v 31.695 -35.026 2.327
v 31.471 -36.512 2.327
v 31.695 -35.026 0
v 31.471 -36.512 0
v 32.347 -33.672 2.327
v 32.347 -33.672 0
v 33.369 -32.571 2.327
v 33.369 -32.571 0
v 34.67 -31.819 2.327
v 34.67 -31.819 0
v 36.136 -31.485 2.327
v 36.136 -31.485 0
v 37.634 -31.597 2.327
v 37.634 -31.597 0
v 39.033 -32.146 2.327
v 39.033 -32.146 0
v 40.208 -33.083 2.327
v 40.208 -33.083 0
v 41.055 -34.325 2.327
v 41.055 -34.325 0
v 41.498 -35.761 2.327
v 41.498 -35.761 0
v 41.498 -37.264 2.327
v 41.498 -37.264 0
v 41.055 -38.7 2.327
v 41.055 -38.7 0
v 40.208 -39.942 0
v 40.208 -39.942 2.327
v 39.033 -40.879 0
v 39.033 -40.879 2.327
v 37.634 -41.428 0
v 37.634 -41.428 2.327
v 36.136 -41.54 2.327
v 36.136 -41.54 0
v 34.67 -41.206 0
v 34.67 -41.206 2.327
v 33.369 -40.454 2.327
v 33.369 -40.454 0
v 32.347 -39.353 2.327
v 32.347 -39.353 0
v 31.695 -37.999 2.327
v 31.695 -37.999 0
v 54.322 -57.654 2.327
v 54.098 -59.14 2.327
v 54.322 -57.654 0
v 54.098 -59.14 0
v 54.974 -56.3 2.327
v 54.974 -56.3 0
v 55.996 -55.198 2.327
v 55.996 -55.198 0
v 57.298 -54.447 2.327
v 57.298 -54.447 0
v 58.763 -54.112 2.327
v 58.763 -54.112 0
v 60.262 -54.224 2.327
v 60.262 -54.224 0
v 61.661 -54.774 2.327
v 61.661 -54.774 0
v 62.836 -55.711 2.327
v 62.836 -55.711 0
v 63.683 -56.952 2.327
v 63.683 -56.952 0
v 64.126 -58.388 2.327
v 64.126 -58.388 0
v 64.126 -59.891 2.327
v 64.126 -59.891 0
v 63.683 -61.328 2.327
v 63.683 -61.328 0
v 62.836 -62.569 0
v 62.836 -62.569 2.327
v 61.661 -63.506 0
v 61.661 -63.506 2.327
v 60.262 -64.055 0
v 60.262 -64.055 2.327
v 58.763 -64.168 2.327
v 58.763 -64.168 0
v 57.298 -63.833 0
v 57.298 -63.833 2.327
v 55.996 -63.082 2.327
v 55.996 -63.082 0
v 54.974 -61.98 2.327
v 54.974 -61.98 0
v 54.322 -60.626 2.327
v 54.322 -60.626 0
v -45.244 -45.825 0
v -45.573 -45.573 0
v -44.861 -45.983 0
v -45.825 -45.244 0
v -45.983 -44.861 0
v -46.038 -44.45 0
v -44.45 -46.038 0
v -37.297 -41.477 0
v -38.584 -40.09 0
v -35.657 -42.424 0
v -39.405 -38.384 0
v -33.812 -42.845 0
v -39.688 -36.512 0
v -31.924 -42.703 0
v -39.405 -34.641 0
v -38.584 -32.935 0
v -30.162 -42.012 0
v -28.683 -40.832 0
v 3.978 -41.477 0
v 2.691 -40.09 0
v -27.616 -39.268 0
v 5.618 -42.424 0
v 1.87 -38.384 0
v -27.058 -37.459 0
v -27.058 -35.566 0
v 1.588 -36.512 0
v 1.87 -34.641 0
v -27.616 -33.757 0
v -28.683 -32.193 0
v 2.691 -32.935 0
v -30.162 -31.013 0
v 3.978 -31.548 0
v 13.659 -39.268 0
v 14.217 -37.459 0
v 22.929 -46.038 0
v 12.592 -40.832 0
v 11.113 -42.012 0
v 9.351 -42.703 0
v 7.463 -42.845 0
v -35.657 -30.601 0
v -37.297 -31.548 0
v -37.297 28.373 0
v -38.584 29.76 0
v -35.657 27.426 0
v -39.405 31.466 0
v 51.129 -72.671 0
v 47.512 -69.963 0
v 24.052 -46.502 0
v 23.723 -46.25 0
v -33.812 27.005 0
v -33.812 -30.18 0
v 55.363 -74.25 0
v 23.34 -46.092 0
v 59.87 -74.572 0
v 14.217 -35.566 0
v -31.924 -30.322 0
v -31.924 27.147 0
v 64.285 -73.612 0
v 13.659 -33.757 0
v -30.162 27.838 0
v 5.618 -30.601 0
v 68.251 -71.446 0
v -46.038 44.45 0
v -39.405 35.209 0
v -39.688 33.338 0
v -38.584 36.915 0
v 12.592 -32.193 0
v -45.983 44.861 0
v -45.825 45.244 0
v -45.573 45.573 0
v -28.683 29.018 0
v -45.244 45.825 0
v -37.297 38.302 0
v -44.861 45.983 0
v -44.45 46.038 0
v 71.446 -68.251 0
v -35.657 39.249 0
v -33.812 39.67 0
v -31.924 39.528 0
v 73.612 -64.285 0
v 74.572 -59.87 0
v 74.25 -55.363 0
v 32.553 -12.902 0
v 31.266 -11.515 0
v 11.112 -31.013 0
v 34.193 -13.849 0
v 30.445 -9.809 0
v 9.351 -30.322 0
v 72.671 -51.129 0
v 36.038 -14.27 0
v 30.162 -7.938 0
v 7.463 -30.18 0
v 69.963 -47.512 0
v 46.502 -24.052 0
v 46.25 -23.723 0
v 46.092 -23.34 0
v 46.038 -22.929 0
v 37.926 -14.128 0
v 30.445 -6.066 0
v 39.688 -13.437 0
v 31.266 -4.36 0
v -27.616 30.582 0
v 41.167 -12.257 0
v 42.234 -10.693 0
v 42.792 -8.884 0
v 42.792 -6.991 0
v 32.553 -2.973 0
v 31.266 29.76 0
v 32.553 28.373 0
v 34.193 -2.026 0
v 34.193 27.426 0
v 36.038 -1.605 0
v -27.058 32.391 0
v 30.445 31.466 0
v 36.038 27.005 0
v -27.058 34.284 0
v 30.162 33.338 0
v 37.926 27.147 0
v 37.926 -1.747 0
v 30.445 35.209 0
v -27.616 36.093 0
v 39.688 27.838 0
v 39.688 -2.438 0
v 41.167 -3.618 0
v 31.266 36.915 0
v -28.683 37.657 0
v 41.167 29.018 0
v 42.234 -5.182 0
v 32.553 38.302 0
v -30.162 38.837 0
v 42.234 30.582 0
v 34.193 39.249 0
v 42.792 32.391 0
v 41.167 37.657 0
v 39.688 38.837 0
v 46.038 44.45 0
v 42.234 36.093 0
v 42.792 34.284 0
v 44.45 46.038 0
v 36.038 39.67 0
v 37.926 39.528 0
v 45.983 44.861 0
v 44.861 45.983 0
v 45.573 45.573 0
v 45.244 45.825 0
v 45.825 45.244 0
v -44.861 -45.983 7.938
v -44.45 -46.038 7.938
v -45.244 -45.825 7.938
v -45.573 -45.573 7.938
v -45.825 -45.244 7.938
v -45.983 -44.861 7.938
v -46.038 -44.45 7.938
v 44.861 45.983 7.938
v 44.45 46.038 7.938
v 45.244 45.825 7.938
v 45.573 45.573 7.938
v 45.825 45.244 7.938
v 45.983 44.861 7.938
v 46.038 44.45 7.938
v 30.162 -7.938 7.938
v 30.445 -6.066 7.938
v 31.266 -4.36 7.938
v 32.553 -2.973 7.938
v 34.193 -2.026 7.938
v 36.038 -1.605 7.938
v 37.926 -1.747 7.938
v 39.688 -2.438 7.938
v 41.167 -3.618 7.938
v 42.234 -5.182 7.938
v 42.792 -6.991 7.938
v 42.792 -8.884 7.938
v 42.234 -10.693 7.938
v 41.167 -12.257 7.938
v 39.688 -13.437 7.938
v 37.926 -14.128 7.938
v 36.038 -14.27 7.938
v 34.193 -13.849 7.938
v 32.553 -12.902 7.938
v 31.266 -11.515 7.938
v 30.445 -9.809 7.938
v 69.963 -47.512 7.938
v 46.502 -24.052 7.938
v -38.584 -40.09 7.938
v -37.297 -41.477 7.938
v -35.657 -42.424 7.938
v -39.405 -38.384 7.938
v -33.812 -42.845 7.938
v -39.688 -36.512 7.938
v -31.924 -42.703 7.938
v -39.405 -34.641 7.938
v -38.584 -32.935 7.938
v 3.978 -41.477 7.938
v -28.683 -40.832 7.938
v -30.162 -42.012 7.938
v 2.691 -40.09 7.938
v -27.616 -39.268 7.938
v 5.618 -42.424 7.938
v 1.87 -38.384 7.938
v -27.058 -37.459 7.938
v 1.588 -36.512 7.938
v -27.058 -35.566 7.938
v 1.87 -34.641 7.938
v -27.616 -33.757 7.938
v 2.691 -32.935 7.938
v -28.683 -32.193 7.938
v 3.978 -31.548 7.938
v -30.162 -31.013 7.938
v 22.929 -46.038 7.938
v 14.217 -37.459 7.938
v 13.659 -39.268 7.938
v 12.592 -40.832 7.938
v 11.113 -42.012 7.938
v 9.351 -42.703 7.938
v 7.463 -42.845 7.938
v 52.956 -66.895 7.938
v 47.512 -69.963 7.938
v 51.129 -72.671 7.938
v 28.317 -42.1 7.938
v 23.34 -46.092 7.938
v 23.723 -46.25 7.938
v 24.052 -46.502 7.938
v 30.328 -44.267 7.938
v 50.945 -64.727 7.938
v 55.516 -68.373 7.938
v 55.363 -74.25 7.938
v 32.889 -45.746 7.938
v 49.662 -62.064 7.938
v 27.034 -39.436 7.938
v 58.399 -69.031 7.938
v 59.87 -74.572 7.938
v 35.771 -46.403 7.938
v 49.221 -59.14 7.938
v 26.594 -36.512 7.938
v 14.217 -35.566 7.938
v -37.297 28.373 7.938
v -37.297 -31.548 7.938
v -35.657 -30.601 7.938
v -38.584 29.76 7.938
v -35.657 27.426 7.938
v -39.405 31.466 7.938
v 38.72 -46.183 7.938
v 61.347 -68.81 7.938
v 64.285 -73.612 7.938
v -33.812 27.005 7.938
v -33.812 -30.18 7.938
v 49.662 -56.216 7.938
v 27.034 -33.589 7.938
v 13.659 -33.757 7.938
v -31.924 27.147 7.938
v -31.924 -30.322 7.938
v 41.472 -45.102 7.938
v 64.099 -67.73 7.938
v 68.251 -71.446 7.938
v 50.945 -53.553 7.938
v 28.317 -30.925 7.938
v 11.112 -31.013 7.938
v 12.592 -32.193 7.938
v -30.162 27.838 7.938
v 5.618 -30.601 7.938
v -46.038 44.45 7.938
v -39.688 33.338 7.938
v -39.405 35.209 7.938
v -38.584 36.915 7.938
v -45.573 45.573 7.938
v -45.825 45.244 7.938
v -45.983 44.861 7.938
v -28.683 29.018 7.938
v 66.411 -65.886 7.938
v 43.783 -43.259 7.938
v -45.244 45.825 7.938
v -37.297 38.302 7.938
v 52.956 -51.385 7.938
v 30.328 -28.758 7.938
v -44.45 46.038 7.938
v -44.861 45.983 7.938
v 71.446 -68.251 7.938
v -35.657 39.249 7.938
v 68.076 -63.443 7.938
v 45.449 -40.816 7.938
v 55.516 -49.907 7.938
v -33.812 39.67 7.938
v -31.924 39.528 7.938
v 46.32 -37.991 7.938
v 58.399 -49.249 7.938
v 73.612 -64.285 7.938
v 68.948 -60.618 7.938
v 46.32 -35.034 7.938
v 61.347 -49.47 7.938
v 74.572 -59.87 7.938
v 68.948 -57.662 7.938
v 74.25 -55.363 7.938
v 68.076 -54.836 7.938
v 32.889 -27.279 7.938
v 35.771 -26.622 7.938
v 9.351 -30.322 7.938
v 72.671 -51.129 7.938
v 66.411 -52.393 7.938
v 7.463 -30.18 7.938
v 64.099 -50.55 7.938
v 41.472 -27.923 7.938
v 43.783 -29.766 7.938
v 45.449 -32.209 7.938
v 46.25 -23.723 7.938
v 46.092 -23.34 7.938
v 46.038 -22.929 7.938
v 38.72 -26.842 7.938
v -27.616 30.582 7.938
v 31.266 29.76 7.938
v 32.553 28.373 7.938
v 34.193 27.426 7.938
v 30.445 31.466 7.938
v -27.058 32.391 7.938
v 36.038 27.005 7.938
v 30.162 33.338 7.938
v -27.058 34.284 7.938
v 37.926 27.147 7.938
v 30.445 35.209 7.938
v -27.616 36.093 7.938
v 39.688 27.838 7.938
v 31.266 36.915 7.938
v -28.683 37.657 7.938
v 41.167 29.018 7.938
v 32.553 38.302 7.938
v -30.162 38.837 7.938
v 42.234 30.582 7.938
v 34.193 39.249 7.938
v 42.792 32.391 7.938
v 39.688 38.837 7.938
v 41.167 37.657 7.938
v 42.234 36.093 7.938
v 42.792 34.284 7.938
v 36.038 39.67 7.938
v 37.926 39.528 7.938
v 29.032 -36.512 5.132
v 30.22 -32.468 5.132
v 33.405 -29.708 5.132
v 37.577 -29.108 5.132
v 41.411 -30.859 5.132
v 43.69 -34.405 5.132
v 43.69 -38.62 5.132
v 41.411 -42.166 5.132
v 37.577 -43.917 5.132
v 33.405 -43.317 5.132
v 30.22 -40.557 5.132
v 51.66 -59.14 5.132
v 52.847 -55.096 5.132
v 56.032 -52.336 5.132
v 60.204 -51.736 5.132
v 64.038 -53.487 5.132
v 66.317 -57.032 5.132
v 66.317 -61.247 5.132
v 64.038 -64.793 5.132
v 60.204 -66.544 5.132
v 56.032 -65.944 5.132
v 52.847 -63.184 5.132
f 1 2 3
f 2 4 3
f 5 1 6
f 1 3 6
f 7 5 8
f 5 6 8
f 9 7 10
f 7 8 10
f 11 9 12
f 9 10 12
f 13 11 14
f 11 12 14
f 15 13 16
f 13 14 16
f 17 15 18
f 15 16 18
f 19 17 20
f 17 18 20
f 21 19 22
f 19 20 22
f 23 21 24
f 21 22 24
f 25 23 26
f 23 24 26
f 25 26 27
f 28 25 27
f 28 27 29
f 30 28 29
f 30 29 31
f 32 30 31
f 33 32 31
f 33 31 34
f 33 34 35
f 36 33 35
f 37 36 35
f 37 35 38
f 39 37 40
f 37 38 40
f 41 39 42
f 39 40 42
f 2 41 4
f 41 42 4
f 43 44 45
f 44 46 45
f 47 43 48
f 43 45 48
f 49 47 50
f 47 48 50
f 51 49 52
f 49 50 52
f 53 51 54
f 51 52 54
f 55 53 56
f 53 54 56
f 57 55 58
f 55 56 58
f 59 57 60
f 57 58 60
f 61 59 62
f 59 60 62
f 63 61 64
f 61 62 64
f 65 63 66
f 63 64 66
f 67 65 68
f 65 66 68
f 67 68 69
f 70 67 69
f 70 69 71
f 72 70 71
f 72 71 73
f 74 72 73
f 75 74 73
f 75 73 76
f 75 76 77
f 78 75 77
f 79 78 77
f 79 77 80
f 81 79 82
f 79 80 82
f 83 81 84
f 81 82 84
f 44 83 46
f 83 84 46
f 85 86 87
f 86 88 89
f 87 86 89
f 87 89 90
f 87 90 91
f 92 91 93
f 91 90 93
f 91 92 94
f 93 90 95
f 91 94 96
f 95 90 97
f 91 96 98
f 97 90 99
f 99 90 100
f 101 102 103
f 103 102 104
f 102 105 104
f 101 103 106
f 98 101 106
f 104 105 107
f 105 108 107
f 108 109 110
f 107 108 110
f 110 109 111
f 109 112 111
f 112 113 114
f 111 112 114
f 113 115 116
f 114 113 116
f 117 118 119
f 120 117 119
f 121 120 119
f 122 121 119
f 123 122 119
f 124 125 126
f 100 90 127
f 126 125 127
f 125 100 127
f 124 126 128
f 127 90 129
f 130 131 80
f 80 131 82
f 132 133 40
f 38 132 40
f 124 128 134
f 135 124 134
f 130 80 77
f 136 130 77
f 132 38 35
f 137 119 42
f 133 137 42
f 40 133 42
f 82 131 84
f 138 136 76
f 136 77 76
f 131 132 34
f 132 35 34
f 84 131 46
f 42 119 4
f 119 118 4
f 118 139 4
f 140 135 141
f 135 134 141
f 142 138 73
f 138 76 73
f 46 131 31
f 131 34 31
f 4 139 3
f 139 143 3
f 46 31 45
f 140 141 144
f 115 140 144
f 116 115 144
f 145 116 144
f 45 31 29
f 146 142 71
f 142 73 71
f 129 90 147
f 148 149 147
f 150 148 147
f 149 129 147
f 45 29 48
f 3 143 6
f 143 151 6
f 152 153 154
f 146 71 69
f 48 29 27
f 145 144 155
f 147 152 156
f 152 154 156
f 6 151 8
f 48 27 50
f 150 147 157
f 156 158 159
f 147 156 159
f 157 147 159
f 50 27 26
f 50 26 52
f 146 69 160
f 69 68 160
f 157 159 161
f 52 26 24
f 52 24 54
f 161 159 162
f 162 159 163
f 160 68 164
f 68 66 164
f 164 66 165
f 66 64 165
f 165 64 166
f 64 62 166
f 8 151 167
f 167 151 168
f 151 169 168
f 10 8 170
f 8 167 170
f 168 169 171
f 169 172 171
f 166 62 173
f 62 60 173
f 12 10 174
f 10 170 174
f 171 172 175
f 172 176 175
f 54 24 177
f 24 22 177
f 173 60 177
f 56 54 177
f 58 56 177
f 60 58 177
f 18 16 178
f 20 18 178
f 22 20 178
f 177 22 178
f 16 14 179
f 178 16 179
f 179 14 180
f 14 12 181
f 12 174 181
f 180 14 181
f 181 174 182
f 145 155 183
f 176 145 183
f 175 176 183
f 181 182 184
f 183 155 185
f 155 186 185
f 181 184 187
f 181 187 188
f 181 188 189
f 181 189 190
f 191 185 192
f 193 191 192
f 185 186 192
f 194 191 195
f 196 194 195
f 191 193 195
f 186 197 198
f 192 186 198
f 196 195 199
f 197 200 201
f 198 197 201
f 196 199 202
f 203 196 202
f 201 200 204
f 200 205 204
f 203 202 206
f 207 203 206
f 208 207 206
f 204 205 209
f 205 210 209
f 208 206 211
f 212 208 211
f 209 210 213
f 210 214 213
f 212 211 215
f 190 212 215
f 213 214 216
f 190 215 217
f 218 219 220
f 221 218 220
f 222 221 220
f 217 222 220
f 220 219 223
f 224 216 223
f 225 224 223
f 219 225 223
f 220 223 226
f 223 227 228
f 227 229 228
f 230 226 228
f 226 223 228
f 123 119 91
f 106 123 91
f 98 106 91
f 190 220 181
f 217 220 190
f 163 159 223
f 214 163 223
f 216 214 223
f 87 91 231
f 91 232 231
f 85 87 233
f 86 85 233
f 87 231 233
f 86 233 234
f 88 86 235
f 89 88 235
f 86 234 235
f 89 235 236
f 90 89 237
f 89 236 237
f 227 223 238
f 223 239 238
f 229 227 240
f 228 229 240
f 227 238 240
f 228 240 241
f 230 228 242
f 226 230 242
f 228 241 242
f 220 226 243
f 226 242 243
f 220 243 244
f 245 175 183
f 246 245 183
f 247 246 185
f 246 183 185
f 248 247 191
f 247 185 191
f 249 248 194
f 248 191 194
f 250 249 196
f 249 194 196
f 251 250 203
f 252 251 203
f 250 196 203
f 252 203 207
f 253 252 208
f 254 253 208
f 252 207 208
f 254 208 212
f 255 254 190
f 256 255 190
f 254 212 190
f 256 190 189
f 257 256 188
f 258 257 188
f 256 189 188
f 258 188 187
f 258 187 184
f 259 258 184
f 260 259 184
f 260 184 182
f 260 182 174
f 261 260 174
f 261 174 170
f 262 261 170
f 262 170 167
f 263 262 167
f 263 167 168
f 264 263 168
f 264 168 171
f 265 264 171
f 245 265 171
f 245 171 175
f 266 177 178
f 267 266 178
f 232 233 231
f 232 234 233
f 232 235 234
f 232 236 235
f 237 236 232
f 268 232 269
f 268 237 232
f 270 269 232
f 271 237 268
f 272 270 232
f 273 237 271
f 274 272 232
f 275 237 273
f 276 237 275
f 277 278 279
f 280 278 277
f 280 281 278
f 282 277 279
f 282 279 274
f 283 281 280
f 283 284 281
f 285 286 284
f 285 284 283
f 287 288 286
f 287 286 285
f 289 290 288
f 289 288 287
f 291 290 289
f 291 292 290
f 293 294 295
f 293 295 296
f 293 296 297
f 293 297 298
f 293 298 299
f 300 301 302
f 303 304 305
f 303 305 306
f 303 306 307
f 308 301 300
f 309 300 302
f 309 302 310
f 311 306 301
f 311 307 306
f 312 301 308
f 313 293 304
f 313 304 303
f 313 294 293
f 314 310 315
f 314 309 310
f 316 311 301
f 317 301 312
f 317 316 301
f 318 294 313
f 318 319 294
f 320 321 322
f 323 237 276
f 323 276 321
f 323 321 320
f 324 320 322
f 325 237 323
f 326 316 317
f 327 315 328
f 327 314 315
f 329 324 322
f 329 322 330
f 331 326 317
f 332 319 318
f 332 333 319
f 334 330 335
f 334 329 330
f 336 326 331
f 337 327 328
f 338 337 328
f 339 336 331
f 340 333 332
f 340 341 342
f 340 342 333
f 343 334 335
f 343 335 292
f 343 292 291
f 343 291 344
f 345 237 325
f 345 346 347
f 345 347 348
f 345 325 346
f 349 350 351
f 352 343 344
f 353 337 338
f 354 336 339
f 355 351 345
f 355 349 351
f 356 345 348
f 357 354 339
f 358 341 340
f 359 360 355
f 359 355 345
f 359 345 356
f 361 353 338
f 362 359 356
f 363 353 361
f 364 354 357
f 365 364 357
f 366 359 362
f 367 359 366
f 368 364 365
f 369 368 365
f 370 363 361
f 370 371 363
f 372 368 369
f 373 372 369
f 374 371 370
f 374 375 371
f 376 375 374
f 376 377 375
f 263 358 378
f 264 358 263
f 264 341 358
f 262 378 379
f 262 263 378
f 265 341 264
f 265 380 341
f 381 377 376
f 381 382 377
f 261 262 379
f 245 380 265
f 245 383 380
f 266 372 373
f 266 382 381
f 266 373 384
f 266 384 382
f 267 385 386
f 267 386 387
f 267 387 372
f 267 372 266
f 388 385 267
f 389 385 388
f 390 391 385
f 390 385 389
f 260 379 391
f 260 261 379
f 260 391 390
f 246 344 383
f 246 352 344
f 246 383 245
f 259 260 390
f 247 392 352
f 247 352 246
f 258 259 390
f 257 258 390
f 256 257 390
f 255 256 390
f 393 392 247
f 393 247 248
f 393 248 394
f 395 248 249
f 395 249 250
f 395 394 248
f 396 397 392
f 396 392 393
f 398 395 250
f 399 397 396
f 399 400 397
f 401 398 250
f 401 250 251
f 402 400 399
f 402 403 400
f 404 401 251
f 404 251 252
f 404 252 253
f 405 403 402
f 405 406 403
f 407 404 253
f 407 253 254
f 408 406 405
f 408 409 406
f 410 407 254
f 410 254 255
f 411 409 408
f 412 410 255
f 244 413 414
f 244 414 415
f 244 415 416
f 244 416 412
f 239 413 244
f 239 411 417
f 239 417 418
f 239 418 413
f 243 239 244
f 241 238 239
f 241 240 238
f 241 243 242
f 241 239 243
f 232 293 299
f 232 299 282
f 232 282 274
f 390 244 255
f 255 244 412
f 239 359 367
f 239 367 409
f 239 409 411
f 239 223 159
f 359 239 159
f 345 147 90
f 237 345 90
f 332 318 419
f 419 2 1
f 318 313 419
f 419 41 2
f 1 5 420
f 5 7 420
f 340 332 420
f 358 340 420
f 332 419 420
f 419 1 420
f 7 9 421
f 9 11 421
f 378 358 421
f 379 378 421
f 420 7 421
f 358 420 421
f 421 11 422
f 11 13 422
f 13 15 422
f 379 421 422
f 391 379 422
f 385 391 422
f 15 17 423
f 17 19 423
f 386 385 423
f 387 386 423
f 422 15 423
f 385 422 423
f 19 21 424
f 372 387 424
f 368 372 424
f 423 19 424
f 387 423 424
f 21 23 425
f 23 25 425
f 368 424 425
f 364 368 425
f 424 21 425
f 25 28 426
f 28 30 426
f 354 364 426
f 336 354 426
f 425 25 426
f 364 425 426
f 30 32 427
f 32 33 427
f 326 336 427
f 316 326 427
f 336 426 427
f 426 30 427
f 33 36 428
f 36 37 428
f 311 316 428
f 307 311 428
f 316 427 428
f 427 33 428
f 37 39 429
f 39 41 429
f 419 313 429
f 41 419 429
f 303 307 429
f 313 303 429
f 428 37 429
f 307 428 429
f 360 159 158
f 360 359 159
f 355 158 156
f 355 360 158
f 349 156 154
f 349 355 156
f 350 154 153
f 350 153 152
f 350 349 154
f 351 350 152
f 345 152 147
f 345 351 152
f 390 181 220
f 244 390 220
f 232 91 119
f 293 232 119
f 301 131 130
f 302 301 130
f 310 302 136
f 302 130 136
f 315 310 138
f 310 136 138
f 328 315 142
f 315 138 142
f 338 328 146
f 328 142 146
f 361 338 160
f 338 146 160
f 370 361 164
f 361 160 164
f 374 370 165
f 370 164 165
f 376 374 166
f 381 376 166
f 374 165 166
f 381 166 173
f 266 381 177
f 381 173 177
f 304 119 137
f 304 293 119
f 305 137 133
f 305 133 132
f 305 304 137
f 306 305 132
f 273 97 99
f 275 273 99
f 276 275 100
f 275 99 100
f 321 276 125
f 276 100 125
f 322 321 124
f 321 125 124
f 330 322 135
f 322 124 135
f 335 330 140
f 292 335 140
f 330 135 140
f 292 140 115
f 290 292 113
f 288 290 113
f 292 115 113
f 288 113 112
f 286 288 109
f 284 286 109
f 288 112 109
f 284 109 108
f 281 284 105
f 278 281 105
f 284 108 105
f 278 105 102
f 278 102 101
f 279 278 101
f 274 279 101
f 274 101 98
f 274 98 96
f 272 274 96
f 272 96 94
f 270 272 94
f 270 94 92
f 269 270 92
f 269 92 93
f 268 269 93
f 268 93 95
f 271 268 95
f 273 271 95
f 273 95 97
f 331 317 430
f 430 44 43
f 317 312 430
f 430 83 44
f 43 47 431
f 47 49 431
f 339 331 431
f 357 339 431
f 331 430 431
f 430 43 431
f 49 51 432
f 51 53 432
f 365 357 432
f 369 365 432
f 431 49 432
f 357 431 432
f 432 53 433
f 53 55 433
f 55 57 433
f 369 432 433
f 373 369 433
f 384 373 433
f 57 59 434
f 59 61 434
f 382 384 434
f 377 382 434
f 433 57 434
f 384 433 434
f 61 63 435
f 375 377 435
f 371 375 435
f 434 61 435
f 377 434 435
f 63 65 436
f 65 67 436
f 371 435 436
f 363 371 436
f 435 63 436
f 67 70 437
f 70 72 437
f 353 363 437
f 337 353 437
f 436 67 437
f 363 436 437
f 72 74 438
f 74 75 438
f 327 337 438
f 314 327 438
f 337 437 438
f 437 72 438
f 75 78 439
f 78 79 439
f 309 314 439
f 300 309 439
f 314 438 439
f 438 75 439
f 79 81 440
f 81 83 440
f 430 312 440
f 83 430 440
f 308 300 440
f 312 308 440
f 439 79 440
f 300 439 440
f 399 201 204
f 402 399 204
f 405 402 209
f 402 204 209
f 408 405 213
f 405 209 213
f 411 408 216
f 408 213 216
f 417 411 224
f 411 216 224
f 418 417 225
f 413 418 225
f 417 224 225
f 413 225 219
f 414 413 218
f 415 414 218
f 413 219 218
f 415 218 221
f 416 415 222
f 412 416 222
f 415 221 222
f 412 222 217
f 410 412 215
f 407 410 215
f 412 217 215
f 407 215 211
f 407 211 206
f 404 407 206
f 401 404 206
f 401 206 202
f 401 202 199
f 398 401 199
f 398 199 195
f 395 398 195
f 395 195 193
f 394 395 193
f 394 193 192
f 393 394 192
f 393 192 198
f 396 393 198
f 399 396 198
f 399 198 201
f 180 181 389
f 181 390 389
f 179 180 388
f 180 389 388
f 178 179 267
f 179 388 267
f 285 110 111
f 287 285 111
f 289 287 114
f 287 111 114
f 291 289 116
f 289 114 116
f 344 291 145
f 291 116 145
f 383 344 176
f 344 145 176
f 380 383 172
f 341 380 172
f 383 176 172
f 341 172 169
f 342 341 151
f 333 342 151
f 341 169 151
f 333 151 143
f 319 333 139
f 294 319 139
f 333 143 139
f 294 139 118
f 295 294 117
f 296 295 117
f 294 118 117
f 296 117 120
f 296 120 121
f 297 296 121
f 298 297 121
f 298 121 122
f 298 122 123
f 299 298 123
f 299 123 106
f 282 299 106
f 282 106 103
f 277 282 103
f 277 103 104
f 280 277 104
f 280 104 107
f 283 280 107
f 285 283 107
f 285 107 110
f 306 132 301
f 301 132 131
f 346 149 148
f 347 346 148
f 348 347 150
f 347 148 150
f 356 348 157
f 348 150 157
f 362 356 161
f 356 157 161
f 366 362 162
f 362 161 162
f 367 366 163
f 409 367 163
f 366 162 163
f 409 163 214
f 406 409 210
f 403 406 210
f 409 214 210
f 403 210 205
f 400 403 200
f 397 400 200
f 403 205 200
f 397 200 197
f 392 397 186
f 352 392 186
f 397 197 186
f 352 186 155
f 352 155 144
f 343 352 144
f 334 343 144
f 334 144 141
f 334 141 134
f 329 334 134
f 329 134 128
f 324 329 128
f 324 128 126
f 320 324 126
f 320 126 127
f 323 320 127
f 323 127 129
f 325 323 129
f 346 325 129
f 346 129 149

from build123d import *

# Parameters (mm, degrees)
F1_DEPTH       = 7.9375
F3_D           = 12.7
F5_D           = 10.0838
F5_CSINK_D     = 19.8374
F5_CSINK_ANGLE = 82
F6_R           = 1.5875


with BuildPart() as f1:
    # F0 (on Top) → F1 (new body)
    with BuildSketch(Plane.XY):
        with BuildLine():
            Line((-46.0375, -46.0375), (23.5868596973, -46.0375))
            Line((23.5868596973, -46.0375), (47.5121798487, -69.9628201513))
            ThreePointArc((47.5121798487, -69.9628201513), (69.9628201513, -69.9628201513), (69.9628201513, -47.5121798487))
            Line((69.9628201513, -47.5121798487), (46.0375, -23.5868596973))
            Line((46.0375, -23.5868596973), (46.0375, 46.0375))
            Line((46.0375, 46.0375), (-46.0375, 46.0375))
            Line((-46.0375, 46.0375), (-46.0375, -46.0375))
        make_face()
    extrude(amount=F1_DEPTH)

    # F3 (through all)
    with Locations(Plane.XY.offset(7.9375)):
        with Locations((-33.3375, 33.3375), (-33.3375, -36.5125), (7.9375, -36.5125), (36.5125, -7.9375), (36.5125, 33.3375)):
            Hole(F3_D / 2)

    # F5 (through all)
    with Locations(Plane.XY.offset(7.9375)):
        with Locations((36.5125, -36.5125), (59.139916998, -59.139916998)):
            CounterSinkHole(F5_D / 2, F5_CSINK_D / 2, counter_sink_angle=F5_CSINK_ANGLE)

    # F6
    f6_edges = [f1.edges().sort_by_distance(p)[0] for p in [
        (-46.0375, -46.0375, 3.96875),
        (-46.0375, 46.0375, 3.96875),
        (46.0375, 46.0375, 3.96875),
        (46.0375, -23.58686, 3.96875),
        (23.58686, -46.0375, 3.96875),
    ]]
    fillet(f6_edges, radius=F6_R)


solid = f1.part
